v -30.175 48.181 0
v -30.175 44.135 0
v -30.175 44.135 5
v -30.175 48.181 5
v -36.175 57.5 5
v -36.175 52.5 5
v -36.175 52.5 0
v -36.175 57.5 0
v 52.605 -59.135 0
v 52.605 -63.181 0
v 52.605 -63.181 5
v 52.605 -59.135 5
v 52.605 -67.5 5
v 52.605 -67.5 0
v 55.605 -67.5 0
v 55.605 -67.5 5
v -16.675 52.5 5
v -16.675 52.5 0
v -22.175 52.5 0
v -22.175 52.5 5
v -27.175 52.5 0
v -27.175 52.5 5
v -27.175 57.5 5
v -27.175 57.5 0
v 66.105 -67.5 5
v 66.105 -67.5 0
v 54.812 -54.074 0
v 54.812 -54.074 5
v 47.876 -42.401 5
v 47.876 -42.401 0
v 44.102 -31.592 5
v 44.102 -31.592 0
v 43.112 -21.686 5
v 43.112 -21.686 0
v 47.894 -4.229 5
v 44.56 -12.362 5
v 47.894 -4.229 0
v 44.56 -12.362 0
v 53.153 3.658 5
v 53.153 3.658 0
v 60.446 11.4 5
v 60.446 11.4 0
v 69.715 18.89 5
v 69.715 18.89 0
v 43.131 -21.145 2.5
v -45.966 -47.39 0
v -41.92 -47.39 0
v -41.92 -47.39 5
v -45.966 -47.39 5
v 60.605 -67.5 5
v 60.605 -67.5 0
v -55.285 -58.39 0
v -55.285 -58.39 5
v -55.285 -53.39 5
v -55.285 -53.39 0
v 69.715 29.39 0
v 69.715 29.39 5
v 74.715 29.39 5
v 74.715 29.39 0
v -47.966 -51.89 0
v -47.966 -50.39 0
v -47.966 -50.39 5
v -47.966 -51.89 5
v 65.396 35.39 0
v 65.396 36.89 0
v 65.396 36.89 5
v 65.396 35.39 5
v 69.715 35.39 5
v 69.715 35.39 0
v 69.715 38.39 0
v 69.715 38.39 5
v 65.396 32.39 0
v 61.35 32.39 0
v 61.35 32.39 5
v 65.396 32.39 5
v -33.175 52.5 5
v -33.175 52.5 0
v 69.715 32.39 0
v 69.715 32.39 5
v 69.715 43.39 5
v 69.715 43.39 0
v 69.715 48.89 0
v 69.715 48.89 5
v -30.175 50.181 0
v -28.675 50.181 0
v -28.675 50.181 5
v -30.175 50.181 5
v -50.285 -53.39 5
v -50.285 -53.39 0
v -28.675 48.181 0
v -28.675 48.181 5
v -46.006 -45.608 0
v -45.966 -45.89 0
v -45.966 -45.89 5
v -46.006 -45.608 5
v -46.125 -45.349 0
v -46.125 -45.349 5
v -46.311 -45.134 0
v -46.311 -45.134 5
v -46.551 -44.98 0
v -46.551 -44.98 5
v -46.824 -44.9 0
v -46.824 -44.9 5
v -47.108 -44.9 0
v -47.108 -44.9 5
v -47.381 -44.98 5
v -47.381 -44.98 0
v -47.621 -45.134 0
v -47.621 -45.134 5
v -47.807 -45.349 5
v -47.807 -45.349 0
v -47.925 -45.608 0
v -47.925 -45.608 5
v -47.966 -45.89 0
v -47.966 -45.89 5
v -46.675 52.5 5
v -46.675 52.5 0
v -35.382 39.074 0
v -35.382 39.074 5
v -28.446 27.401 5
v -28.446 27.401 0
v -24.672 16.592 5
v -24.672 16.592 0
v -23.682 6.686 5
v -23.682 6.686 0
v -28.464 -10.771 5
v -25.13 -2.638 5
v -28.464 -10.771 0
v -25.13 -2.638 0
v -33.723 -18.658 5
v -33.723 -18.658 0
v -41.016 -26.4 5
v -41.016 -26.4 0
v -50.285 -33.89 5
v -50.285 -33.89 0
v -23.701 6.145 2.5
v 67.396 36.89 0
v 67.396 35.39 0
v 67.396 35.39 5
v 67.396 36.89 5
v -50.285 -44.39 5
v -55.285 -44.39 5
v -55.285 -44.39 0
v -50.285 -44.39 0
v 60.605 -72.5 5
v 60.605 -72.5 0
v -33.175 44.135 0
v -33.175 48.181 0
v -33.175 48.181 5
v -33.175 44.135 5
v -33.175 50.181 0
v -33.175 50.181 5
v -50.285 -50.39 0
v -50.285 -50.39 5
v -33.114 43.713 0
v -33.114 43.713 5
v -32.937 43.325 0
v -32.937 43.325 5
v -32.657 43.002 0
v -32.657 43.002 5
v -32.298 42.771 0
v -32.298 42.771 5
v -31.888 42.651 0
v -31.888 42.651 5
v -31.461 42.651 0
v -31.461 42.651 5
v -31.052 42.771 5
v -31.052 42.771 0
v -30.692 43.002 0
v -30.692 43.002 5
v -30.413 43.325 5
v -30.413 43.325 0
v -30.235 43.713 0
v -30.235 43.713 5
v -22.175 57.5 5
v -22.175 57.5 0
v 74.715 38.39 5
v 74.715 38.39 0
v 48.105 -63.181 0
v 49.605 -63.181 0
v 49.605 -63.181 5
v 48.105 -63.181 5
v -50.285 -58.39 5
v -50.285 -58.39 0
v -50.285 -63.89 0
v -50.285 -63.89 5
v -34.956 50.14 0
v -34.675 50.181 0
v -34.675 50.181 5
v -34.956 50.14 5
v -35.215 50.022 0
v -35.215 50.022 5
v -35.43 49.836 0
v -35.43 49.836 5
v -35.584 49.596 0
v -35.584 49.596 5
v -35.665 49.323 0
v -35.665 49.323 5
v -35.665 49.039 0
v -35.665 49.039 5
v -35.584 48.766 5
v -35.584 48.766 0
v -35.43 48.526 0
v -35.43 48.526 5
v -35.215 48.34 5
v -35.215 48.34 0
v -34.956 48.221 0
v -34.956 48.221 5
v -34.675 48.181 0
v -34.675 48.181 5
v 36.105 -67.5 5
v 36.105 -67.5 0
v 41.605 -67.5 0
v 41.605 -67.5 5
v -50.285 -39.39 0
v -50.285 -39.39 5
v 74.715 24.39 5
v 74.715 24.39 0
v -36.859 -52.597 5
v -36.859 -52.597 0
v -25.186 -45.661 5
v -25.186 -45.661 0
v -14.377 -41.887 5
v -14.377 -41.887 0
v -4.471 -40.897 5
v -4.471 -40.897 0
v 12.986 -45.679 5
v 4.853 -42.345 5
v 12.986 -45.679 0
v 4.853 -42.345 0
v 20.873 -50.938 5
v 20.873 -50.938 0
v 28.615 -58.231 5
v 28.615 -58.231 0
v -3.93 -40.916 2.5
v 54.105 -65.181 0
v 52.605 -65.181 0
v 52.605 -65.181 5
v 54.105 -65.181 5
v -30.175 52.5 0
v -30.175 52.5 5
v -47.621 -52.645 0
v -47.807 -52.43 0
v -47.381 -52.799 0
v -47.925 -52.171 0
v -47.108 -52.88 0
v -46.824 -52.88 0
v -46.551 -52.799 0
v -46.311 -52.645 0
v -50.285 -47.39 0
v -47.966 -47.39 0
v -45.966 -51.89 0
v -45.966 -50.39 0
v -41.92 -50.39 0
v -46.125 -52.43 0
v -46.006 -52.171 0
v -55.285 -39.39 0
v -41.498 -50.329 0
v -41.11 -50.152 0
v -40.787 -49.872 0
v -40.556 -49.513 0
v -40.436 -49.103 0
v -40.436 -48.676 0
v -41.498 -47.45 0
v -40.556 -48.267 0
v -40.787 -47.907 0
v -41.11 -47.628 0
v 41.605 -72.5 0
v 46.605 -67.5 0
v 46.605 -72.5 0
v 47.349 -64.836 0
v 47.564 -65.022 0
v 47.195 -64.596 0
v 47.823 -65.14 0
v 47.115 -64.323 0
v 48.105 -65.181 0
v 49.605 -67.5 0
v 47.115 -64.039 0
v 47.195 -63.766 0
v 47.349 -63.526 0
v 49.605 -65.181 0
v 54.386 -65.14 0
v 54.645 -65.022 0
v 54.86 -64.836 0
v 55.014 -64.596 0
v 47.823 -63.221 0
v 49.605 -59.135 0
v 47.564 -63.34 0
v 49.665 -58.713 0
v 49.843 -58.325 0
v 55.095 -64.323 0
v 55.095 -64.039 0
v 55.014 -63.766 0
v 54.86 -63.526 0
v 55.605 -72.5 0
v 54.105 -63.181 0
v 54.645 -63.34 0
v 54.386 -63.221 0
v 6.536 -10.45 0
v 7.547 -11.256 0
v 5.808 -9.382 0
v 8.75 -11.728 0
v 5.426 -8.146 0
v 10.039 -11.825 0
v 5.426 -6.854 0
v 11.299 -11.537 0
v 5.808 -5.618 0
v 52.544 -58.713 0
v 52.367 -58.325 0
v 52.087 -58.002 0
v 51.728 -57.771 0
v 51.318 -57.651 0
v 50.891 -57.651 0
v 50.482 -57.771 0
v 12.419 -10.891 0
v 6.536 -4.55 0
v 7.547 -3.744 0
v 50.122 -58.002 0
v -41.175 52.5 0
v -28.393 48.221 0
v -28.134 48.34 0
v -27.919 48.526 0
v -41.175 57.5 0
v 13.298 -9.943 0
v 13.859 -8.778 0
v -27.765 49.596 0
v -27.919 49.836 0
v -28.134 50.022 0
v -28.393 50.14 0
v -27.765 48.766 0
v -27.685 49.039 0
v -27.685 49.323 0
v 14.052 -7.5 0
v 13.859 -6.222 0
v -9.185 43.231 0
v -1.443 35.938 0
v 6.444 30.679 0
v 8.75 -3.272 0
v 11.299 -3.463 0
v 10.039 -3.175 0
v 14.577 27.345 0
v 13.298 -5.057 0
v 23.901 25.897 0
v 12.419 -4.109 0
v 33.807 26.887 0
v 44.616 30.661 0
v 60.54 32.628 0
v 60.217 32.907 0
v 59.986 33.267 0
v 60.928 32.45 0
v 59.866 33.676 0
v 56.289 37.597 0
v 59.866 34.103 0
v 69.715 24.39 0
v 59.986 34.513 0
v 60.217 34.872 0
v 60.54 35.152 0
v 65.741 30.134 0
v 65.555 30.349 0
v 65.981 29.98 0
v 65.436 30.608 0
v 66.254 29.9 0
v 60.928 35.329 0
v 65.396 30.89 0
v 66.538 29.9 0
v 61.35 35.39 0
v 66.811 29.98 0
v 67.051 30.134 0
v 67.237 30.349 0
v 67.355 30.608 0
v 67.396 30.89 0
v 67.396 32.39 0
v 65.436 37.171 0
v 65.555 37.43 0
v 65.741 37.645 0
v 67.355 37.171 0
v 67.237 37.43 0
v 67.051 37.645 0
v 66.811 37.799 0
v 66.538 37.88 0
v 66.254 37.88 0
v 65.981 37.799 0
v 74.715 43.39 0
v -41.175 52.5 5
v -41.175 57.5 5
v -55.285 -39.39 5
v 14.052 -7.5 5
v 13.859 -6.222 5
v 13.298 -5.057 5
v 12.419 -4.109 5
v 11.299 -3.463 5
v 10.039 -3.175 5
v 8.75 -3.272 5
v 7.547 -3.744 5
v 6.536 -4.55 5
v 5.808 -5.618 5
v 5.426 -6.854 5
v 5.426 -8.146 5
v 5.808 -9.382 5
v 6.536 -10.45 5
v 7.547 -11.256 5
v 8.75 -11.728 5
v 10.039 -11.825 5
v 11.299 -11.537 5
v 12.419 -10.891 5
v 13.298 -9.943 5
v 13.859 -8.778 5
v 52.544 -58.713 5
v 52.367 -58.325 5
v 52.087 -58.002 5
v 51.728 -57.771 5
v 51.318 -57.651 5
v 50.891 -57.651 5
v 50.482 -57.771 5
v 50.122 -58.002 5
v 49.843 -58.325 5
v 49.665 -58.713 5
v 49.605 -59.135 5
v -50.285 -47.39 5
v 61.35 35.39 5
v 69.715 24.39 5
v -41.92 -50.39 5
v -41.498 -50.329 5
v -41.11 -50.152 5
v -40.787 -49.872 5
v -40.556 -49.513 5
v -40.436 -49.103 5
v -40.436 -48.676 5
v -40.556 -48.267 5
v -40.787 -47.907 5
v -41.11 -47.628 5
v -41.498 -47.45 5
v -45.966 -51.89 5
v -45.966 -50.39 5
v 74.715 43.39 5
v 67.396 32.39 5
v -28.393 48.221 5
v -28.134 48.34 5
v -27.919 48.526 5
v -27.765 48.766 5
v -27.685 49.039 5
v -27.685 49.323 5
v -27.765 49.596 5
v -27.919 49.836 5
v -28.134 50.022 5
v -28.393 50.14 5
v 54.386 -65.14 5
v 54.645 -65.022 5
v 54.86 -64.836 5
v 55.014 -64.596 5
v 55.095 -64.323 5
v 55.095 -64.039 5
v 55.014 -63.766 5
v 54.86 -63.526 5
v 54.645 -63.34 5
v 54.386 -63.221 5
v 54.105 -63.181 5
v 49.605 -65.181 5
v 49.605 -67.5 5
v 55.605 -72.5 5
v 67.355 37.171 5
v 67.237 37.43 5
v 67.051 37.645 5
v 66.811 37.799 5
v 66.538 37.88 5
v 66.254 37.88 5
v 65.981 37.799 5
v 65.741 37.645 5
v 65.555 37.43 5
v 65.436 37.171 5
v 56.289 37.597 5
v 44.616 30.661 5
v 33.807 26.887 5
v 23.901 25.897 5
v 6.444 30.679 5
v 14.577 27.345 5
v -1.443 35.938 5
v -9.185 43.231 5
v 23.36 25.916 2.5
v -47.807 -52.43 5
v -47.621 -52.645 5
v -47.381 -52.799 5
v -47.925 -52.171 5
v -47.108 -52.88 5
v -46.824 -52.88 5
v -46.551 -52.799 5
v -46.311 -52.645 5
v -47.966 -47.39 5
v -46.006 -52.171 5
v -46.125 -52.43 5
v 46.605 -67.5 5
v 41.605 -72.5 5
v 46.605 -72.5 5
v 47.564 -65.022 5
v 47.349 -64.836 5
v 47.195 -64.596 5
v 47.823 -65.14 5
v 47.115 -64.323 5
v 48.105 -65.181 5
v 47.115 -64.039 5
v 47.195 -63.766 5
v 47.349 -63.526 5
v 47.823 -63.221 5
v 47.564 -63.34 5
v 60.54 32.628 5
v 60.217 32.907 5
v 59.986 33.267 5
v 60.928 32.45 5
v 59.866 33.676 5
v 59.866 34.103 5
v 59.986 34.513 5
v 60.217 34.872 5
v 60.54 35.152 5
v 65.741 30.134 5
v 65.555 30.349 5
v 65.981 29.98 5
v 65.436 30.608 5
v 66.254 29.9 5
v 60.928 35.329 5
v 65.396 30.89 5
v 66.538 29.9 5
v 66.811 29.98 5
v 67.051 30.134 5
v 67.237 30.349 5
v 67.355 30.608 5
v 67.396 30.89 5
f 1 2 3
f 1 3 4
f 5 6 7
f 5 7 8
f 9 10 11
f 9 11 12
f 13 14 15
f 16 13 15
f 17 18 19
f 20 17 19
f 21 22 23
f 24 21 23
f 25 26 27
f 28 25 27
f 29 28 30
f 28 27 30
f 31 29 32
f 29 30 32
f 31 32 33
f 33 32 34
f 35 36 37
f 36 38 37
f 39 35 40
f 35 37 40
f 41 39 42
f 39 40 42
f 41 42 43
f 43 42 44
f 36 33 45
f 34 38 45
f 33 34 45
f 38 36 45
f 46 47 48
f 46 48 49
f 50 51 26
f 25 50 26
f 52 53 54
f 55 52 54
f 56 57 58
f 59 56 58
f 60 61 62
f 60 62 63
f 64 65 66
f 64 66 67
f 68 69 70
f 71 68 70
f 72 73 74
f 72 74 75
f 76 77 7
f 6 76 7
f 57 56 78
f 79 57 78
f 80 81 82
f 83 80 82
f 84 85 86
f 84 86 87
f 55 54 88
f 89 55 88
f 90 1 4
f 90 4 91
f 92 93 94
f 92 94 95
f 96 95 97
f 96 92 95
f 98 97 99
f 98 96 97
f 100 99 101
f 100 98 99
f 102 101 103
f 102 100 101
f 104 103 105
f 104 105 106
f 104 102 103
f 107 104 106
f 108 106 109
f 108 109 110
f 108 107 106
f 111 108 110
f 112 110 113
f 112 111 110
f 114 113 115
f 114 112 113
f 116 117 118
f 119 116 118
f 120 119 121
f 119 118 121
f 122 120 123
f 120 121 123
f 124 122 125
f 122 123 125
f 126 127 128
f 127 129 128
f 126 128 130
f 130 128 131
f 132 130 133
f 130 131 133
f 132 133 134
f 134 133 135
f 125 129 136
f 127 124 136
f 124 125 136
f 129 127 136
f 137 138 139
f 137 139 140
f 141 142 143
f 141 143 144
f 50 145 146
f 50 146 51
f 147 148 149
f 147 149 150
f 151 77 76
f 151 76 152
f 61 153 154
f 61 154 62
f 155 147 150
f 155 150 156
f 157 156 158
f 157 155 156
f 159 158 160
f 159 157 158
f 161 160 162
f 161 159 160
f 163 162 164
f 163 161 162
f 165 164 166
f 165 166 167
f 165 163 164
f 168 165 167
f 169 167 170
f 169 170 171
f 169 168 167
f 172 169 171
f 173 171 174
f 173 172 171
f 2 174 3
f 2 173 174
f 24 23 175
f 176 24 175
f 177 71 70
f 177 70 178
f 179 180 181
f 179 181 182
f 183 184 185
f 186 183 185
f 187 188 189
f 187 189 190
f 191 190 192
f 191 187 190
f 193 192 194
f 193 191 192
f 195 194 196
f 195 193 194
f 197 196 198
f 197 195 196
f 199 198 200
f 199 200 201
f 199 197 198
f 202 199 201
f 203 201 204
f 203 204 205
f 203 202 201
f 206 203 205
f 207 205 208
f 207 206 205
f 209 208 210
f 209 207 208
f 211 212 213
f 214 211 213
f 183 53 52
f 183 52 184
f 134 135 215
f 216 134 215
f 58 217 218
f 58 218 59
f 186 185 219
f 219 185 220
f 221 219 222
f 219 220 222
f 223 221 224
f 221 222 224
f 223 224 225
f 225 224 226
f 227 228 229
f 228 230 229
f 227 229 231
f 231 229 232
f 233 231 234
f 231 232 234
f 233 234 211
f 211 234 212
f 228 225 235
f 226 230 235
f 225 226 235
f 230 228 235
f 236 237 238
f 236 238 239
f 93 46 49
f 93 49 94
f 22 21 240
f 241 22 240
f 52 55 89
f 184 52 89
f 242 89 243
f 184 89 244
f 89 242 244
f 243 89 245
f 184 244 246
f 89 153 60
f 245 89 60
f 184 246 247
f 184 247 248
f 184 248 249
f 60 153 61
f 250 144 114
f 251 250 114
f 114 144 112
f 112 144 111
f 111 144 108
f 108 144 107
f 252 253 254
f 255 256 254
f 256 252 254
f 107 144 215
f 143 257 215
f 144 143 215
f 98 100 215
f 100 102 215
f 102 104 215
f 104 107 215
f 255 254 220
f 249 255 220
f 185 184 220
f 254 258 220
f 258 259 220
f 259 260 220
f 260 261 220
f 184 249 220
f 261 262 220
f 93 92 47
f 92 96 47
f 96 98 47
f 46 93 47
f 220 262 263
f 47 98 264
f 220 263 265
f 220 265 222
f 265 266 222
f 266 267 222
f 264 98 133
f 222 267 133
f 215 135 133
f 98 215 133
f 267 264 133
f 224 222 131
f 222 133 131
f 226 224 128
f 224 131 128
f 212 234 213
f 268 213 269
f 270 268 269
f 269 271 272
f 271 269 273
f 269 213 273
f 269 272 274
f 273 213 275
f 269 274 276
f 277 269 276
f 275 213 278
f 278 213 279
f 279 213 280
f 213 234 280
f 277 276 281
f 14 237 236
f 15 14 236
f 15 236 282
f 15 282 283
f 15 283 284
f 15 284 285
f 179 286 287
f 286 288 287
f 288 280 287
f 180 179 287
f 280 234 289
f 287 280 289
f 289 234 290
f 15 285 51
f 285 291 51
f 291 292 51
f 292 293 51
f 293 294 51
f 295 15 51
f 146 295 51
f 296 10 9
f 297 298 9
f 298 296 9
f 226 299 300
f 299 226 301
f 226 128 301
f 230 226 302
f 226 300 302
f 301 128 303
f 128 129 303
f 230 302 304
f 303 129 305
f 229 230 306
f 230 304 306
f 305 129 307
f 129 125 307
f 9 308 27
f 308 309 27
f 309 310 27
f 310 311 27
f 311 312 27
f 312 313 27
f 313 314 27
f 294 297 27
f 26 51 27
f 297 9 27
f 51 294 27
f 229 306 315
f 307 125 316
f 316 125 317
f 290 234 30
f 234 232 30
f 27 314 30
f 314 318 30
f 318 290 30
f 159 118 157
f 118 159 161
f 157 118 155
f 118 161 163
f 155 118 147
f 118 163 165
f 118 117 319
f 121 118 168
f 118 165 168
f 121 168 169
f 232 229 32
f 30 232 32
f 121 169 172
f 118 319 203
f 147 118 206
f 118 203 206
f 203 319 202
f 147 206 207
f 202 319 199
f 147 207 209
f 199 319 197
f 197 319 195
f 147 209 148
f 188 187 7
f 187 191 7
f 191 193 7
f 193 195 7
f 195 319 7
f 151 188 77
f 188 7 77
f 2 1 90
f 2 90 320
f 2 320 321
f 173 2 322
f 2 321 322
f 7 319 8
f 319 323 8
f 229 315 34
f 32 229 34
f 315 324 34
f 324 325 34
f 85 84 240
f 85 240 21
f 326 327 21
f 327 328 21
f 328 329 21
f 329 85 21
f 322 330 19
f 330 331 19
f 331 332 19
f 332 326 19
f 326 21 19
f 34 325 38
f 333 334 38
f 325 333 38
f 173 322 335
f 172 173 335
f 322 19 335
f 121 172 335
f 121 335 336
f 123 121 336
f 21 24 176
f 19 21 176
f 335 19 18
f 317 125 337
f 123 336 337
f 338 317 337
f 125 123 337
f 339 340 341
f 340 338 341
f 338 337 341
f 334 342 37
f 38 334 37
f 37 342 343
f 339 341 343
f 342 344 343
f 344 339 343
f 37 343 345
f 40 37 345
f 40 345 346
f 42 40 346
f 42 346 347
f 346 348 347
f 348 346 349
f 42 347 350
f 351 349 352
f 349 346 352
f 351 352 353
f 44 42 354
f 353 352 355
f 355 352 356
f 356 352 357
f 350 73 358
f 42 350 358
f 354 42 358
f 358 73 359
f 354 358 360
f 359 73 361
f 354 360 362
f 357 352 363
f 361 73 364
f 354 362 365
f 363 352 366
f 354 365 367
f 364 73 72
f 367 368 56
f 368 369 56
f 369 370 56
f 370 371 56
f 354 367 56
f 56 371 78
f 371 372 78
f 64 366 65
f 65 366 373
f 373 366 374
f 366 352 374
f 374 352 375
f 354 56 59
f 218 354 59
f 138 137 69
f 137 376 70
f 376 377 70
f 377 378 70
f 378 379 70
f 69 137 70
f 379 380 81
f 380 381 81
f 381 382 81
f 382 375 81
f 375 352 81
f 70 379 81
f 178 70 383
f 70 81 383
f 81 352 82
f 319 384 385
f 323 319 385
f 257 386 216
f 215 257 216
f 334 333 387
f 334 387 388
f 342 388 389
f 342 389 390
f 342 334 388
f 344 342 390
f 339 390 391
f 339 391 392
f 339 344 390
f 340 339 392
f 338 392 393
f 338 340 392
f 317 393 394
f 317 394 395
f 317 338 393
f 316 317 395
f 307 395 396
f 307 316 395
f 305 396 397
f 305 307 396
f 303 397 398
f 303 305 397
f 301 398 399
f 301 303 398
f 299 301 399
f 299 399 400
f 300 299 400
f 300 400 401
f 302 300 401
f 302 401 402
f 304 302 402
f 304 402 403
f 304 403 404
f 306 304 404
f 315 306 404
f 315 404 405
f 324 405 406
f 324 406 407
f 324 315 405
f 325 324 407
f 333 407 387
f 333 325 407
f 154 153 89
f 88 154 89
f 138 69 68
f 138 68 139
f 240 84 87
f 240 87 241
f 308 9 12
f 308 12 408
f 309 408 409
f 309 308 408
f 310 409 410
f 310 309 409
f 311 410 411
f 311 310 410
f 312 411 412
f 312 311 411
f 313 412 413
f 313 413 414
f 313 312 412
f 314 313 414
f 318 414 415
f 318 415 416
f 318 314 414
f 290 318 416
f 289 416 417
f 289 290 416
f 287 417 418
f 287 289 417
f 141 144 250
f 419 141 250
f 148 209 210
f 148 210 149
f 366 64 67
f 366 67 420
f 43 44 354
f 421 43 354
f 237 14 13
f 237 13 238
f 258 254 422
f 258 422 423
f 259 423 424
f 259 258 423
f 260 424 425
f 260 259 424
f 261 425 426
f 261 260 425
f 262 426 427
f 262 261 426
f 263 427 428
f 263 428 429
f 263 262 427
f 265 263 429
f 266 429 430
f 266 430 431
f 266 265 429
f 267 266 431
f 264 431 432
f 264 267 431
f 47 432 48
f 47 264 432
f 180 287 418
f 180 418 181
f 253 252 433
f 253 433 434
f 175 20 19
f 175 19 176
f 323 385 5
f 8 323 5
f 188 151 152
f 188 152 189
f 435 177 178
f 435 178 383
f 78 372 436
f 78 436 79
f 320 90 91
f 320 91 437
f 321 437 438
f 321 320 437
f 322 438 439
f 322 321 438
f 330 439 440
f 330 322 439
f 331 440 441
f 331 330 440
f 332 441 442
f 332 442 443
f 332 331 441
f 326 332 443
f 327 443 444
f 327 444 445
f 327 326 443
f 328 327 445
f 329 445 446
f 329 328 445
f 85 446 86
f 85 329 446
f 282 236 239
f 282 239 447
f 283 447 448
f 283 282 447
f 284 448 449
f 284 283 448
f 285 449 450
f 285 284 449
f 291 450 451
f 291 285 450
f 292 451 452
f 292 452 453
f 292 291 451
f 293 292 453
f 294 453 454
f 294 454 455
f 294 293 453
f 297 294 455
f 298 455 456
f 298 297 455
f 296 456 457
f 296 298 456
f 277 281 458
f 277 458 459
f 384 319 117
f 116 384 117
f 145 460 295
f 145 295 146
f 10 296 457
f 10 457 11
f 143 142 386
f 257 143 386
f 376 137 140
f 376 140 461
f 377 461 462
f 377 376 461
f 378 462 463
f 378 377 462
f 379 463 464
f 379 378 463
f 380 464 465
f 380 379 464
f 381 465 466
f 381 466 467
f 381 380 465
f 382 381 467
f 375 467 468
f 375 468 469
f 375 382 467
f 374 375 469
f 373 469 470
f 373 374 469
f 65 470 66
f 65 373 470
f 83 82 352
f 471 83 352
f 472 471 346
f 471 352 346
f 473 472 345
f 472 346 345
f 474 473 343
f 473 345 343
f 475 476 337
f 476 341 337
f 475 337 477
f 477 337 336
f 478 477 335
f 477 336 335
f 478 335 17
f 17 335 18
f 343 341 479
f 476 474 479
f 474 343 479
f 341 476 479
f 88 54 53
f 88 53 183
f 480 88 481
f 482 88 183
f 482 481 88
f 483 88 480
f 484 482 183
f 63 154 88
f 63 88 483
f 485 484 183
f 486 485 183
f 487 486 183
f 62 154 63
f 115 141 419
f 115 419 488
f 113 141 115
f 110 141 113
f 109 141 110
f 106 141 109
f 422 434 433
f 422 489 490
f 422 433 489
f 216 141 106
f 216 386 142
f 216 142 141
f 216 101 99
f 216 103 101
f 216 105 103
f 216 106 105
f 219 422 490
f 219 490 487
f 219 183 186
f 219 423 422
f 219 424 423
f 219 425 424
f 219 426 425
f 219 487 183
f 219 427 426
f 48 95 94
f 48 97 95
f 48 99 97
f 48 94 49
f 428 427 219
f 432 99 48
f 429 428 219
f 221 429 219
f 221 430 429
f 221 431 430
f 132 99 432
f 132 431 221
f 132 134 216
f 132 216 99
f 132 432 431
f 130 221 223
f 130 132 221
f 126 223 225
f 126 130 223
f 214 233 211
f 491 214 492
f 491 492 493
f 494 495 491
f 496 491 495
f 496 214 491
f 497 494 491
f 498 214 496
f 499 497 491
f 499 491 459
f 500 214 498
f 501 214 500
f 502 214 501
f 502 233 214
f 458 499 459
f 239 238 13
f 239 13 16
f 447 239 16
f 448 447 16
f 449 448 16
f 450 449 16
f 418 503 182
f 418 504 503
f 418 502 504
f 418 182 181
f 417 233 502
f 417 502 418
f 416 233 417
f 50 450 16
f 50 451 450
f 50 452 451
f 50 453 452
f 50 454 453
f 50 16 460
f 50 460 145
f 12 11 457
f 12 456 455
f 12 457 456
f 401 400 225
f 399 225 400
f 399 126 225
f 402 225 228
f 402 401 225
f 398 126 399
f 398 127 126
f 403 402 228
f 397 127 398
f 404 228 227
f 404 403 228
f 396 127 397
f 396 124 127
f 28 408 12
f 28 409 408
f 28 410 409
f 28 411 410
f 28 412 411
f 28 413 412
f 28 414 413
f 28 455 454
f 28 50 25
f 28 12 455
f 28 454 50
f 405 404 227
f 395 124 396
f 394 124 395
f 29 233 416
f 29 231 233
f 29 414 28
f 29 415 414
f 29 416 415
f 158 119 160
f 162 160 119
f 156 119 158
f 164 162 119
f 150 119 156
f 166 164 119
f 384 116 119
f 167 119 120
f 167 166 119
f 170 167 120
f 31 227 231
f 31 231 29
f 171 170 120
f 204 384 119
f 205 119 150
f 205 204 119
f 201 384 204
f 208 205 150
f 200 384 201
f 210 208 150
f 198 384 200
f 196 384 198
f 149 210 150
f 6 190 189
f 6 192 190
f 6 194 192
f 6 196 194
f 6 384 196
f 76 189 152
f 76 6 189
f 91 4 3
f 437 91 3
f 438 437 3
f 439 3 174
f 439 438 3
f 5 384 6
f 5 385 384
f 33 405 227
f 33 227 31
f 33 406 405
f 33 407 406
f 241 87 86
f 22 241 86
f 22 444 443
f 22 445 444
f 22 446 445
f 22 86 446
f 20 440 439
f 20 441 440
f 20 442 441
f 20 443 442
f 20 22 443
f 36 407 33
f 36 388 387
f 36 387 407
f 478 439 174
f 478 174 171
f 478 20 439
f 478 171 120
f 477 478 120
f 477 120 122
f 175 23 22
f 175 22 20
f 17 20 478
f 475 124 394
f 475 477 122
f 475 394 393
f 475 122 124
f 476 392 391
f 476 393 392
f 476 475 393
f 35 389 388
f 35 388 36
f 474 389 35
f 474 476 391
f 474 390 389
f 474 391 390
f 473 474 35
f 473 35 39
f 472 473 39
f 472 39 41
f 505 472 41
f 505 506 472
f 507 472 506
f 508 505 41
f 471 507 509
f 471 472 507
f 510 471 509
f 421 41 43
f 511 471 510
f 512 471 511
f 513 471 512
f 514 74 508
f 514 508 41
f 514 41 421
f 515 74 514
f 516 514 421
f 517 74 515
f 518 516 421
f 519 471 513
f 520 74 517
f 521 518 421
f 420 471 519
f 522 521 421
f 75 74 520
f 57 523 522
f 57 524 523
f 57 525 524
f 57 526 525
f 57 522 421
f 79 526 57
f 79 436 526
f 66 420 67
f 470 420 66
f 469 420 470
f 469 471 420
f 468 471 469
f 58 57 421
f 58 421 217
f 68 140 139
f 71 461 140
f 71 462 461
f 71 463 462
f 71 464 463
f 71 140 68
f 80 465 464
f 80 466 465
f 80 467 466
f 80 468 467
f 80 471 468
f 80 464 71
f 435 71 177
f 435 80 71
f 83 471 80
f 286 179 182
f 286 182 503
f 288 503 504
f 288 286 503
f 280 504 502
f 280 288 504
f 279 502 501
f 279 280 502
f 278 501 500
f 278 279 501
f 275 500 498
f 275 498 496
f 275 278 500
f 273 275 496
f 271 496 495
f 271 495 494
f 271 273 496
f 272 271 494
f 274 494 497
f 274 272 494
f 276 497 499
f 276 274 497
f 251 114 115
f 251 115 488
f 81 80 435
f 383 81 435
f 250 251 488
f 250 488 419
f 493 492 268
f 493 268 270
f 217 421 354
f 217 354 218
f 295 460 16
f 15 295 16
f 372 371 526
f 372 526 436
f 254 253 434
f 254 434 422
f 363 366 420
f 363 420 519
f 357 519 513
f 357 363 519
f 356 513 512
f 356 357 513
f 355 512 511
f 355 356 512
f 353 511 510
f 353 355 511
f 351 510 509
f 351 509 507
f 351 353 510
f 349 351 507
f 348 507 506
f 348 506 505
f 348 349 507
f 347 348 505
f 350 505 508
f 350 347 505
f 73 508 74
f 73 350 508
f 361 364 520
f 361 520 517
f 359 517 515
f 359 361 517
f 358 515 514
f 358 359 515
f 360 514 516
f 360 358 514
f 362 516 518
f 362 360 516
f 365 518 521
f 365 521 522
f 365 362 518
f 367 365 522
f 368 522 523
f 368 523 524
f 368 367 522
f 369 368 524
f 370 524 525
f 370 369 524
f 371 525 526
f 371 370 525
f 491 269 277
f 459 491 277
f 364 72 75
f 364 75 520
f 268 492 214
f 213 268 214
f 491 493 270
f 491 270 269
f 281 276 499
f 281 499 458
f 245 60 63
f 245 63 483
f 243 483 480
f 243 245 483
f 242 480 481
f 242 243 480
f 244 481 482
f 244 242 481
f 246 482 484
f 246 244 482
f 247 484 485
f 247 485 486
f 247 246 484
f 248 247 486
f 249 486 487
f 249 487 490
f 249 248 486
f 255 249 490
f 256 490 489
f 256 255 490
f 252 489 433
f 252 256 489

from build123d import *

# Parameters (mm, degrees)
SKETCH1_R           = 4.336992443
BOSS_EXTRUDE1_DEPTH = 5
SKETCH2_OUTSIDE_W   = 155.956
SKETCH2_OUTSIDE_H   = 155.956
CUT_EXTRUDE1_DEPTH  = 10
SKETCH3_W           = 5
SKETCH3_H           = 5
BOSS_EXTRUDE2_DEPTH = 5


with BuildPart() as part:
    # Sketch1 → Boss-Extrude1 (new body)
    with BuildSketch(Plane.XY):
        with BuildLine():
            Line((-16.674721166, 52.5), (-46.674721166, 52.5))
            add(Edge.make_bspline(
                [(-46.674721166, 52.5), (1.078343639, 2.985334424), (-50.285, -33.889721166)],
                knots=[0, 0, 0, 1, 1, 1], degree=2))
            Line((-50.285, -33.889721166), (-50.285, -63.889721166))
            add(Edge.make_bspline(
                [(-50.285, -63.889721166), (-0.770334424, -16.136656361), (36.104721166, -67.5)],
                knots=[0, 0, 0, 1, 1, 1], degree=2))
            Line((36.104721166, -67.5), (66.104721166, -67.5))
            add(Edge.make_bspline(
                [(66.104721166, -67.5), (18.351656361, -17.985334424), (69.715, 18.889721166)],
                knots=[0, 0, 0, 1, 1, 1], degree=2))
            Line((69.715, 18.889721166), (69.715, 48.889721166))
            add(Edge.make_bspline(
                [(69.715, 48.889721166), (20.200334424, 1.136656361), (-16.674721166, 52.5)],
                knots=[0, 0, 0, 1, 1, 1], degree=2))
        make_face()
        with Locations((9.715, -7.5)):
            Circle(SKETCH1_R, mode=Mode.SUBTRACT)
    extrude(amount=BOSS_EXTRUDE1_DEPTH)

    # Sketch2 outside → Cut-Extrude1 (cut)
    with BuildSketch(Plane.XY.offset(5)):
        with Locations((9.715, -7.5)):
            Rectangle(SKETCH2_OUTSIDE_W, SKETCH2_OUTSIDE_H)
        with BuildLine():
            Line((-33.174721166, 50.180974538), (-33.174721166, 52.5))
            Line((-33.174721166, 52.500000001), (-46.674721166, 52.5))
            add(Edge.make_bspline(
                [(-46.674721166, 52.5), (1.07834364, 2.985334423), (-50.285000002, -33.889721168)],
                knots=[0, 0, 0, 1, 1, 1], degree=2))
            Line((-50.285000002, -33.889721168), (-50.285000001, -47.389721166))
            Line((-50.285, -47.389721166), (-47.965974538, -47.389721166))
            Line((-47.965974538, -47.389721166), (-47.965974538, -45.889721166))
            ThreePointArc((-47.965974538, -45.889721166), (-46.965974538, -44.889721166), (-45.965974538, -45.889721166))
            Line((-45.965974538, -45.889721166), (-45.965974538, -47.389721166))
            Line((-45.965974538, -47.389721166), (-41.920467471, -47.389721166))
            ThreePointArc((-41.920467471, -47.389721166), (-40.420467471, -48.889721166), (-41.920467471, -50.389721166))
            Line((-41.920467471, -50.389721166), (-45.965974538, -50.389721166))
            Line((-45.965974538, -50.389721166), (-45.965974538, -51.889721166))
            ThreePointArc((-45.965974538, -51.889721166), (-46.965974538, -52.889721166), (-47.965974538, -51.889721166))
            Line((-47.965974538, -51.889721166), (-47.965974538, -50.389721166))
            Line((-47.965974538, -50.389721166), (-50.285, -50.389721166))
            Line((-50.285000001, -50.389721166), (-50.285, -63.889721166))
            add(Edge.make_bspline(
                [(-50.285, -63.889721166), (-0.770334423, -16.13665636), (36.104721168, -67.500000002)],
                knots=[0, 0, 0, 1, 1, 1], degree=2))
            Line((36.104721168, -67.500000002), (49.604721166, -67.500000001))
            Line((49.604721166, -67.5), (49.604721166, -65.180974538))
            Line((49.604721166, -65.180974538), (48.104721166, -65.180974538))
            ThreePointArc((48.104721166, -65.180974538), (47.104721166, -64.180974538), (48.104721166, -63.180974538))
            Line((48.104721166, -63.180974538), (49.604721166, -63.180974538))
            Line((49.604721166, -63.180974538), (49.604721166, -59.135467471))
            ThreePointArc((49.604721166, -59.135467471), (51.104721166, -57.635467471), (52.604721166, -59.135467471))
            Line((52.604721166, -59.135467471), (52.604721166, -63.180974538))
            Line((52.604721166, -63.180974538), (54.104721166, -63.180974538))
            ThreePointArc((54.104721166, -63.180974538), (55.104721166, -64.180974538), (54.104721166, -65.180974538))
            Line((54.104721166, -65.180974538), (52.604721166, -65.180974538))
            Line((52.604721166, -65.180974538), (52.604721166, -67.5))
            Line((52.604721166, -67.500000001), (66.104721166, -67.5))
            add(Edge.make_bspline(
                [(66.104721166, -67.5), (18.351656361, -17.985334424), (69.715, 18.889721166)],
                knots=[0, 0, 0, 1, 1, 1], degree=2))
            Line((69.715, 18.889721166), (69.715, 32.389721166))
            Line((69.715, 32.389721166), (67.395974538, 32.389721166))
            Line((67.395974538, 32.389721166), (67.395974538, 30.889721166))
            ThreePointArc((67.395974538, 30.889721166), (66.395974538, 29.889721166), (65.395974538, 30.889721166))
            Line((65.395974538, 30.889721166), (65.395974538, 32.389721166))
            Line((65.395974538, 32.389721166), (61.350467471, 32.389721166))
            ThreePointArc((61.350467471, 32.389721166), (59.850467471, 33.889721166), (61.350467471, 35.389721166))
            Line((61.350467471, 35.389721166), (65.395974538, 35.389721166))
            Line((65.395974538, 35.389721166), (65.395974538, 36.889721166))
            ThreePointArc((65.395974538, 36.889721166), (66.395974538, 37.889721166), (67.395974538, 36.889721166))
            Line((67.395974538, 36.889721166), (67.395974538, 35.389721166))
            Line((67.395974538, 35.389721166), (69.715, 35.389721166))
            Line((69.715, 35.389721166), (69.715, 48.889721166))
            add(Edge.make_bspline(
                [(69.715, 48.889721166), (20.200334423, 1.13665636), (-16.674721168, 52.500000002)],
                knots=[0, 0, 0, 1, 1, 1], degree=2))
            Line((-16.674721168, 52.500000002), (-30.174721166, 52.500000001))
            Line((-30.174721166, 52.5), (-30.174721166, 50.180974538))
            Line((-30.174721166, 50.180974538), (-28.674721166, 50.180974538))
            ThreePointArc((-28.674721166, 50.180974538), (-27.674721166, 49.180974538), (-28.674721166, 48.180974538))
            Line((-28.674721166, 48.180974538), (-30.174721166, 48.180974538))
            Line((-30.174721166, 48.180974538), (-30.174721166, 44.135467471))
            ThreePointArc((-30.174721166, 44.135467471), (-31.674721166, 42.635467471), (-33.174721166, 44.135467471))
            Line((-33.174721166, 44.135467471), (-33.174721166, 48.180974538))
            Line((-33.174721166, 48.180974538), (-34.674721166, 48.180974538))
            ThreePointArc((-34.674721166, 48.180974538), (-35.674721166, 49.180974538), (-34.674721166, 50.180974538))
            Line((-34.674721166, 50.180974538), (-33.174721166, 50.180974538))
        make_face(mode=Mode.SUBTRACT)
    extrude(amount=-CUT_EXTRUDE1_DEPTH, mode=Mode.SUBTRACT)

    # Sketch3 → Boss-Extrude2 (add)
    with BuildSketch(Plane.XY.offset(5)):
        with Locations((-38.674721166, 55)):
            Rectangle(SKETCH3_W, SKETCH3_H)
        with Locations((-24.674721166, 55)):
            Rectangle(SKETCH3_W, SKETCH3_H)
        with Locations((72.215, 40.889721166)):
            Rectangle(SKETCH3_W, SKETCH3_H)
        with Locations((72.215, 26.889721166)):
            Rectangle(SKETCH3_W, SKETCH3_H)
        with Locations((58.104721166, -70)):
            Rectangle(SKETCH3_W, SKETCH3_H)
        with Locations((44.104721166, -70)):
            Rectangle(SKETCH3_W, SKETCH3_H)
        with Locations((-52.785, -55.889721166)):
            Rectangle(SKETCH3_W, SKETCH3_H)
        with Locations((-52.785, -41.889721166)):
            Rectangle(SKETCH3_W, SKETCH3_H)
    extrude(amount=-BOSS_EXTRUDE2_DEPTH)


solid = part.part
